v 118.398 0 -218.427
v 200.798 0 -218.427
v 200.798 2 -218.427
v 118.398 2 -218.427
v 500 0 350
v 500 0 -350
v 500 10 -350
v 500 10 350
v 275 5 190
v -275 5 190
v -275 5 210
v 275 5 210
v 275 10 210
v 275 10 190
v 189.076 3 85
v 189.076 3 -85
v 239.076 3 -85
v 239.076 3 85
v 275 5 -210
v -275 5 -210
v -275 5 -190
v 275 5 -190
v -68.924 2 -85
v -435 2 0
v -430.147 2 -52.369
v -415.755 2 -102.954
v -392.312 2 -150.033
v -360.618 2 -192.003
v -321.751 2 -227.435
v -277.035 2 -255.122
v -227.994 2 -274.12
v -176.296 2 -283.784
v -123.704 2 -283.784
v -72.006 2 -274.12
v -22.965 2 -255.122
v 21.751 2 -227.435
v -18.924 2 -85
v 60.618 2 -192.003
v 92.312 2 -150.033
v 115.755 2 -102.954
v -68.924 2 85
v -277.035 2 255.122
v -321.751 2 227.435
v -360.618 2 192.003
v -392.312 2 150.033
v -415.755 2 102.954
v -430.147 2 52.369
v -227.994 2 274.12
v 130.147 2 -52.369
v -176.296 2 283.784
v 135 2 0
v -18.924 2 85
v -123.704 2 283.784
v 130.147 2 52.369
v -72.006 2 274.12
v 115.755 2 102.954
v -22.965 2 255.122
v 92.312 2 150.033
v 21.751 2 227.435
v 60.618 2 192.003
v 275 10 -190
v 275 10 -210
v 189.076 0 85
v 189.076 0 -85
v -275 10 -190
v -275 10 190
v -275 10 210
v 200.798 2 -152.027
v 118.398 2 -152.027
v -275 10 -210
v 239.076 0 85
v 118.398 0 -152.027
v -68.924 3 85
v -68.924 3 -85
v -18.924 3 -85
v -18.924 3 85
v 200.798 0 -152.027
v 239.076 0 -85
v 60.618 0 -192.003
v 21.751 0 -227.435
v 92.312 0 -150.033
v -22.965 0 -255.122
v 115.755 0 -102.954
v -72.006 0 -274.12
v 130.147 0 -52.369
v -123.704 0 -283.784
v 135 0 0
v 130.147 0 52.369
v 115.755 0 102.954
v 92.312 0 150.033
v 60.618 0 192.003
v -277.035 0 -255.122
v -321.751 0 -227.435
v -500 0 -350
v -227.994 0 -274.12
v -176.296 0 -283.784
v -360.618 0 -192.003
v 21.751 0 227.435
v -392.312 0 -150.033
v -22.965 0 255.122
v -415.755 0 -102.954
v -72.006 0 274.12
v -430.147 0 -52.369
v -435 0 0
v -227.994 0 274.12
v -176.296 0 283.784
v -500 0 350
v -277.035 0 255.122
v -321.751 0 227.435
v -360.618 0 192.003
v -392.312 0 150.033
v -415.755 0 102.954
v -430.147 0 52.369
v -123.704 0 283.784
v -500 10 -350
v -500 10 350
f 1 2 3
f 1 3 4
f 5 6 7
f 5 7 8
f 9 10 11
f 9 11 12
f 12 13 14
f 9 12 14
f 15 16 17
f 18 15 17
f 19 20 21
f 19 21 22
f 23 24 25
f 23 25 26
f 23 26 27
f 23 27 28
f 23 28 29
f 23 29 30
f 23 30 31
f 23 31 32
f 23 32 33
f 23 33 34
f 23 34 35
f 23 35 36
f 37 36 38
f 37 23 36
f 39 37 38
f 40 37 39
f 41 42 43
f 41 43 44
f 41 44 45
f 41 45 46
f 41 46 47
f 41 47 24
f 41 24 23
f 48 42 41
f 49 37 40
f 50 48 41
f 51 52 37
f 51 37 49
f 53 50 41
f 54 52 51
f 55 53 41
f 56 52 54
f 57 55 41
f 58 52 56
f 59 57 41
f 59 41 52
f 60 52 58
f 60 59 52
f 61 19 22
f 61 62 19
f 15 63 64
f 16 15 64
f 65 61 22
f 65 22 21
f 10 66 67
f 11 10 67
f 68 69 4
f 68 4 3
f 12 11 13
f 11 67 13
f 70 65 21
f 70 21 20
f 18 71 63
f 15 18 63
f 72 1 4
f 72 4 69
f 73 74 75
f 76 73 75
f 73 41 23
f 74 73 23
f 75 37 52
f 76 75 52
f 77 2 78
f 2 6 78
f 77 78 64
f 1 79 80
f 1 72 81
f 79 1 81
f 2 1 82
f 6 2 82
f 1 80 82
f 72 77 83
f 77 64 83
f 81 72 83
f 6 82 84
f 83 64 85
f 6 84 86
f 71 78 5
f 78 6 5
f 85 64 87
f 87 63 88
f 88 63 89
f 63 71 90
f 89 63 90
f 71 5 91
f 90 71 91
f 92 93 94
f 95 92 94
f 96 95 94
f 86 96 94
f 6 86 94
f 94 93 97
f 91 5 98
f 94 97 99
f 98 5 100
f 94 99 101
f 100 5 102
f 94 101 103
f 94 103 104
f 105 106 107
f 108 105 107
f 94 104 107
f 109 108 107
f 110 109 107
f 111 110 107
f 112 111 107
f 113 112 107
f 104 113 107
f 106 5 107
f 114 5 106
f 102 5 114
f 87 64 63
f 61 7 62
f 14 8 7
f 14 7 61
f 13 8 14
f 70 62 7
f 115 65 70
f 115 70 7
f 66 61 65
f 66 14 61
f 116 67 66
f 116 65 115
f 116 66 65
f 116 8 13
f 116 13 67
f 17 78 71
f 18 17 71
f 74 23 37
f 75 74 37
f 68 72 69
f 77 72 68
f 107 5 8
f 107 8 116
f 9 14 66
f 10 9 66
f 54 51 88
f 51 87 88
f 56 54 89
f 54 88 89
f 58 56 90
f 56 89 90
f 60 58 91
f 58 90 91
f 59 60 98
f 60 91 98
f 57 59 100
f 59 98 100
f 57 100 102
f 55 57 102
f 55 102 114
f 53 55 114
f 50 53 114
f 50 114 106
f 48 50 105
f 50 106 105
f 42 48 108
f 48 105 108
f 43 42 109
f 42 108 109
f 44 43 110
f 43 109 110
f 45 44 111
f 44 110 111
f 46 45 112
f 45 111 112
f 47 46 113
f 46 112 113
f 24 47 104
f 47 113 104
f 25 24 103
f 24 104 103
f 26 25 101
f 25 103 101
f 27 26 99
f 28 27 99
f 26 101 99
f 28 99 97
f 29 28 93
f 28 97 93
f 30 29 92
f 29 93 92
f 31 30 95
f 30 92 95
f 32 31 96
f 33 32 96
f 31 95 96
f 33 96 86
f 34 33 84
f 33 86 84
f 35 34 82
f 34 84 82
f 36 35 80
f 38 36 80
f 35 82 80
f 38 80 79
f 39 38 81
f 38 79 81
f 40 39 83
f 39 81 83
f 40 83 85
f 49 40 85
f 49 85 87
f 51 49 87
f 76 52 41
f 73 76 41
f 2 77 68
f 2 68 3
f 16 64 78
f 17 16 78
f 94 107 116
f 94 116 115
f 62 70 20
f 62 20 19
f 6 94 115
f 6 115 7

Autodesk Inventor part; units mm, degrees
ref_plane "YZ Plane" through (0, 0, 0) normal (1, 0, 0) x (0, 1, 0)
ref_plane "XZ Plane" through (0, 0, 0) normal (0, 1, 0) x (-1, 0, 0)
ref_plane "XY Plane" through (0, 0, 0) normal (0, 0, 1) x (1, 0, 0)
sketch "Sketch1" plane through (0, 0, 0) normal (0, 1, 0) x (-1, 0, 0)
  line L0 (500, -350) -> (-500, -350)
  line L1 (-500, -350) -> (-500, 350)
  line L2 (-500, 350) -> (500, 350)
  line L3 (500, 350) -> (500, -350)
  line L4 (500, -350) -> (-500, 350) construction
  line L5 (-500, -350) -> (500, 350) construction
  point P0 (0, 0)
  dimension "d0" = 1000
  dimension "d1" = 700
extrude "Extrusion1" add sketch "Sketch1" along normal blind 10
sketch "Sketch2" plane through (0, 10, 0) normal (0, 1, 0) x (1, 0, 0)
  line L0 (-500, -350) -> (500, -350) projected
  line L1 (500, -350) -> (500, 350) projected
  line L2 (500, 350) -> (-500, 350) projected
  line L3 (-500, 350) -> (-500, -350) projected
  line L4 (-275, -210) -> (275, -210) construction
  line L5 (275, -210) -> (275, 210) construction
  line L6 (275, 210) -> (-275, 210) construction
  line L7 (-275, 210) -> (-275, -210) construction
  line L8 (-275, -210) -> (275, 210) construction
  line L9 (275, -210) -> (-275, 210) construction
  line L10 (-275, -210) -> (275, -210)
  line L11 (275, -210) -> (275, -190)
  line L12 (275, -190) -> (-275, -190)
  line L13 (-275, -190) -> (-275, -210)
  line L14 (-275, 210) -> (275, 210)
  line L15 (275, 210) -> (275, 190)
  line L16 (275, 190) -> (-275, 190)
  line L17 (-275, 190) -> (-275, 210)
  point P0 (0, 0)
  dimension "d4" = 550
  dimension "d5" = 420
  dimension "d6" = 20
  dimension "d7" = 20
extrude "Extrusion2" cut sketch "Sketch2" against normal blind 5 contours L13 L12 L11 L10 | L14 L15 L16 L17
sketch "Sketch3" plane through (0, 0, 0) normal (0, -1, 0) x (1, 0, 0)
  line L0 (-500, 350) -> (500, 350) projected
  line L1 (-500, -350) -> (-500, 350) projected
  line L2 (500, -350) -> (-500, -350) projected
  line L3 (500, 350) -> (500, -350) projected
  line L4 (500, -350) -> (-500, -350) construction
  line L5 (0, -350) -> (0, 350) construction
  line L6 (-500, -350) -> (-500, 350) construction
  line L7 (-500, 0) -> (500, 0) construction
  circle A0 centre (-150, 0) radius 285
  circle A1 centre (-150, 0) radius 325 construction
  line L8 (200.7977, -218.4266) -> (118.3977, -218.4266)
  line L9 (118.3977, -218.4266) -> (118.3977, -152.0266)
  line L10 (118.3977, -152.0266) -> (200.7977, -152.0266)
  line L11 (200.7977, -152.0266) -> (200.7977, -218.4266)
  line L12 (-18.9239, 85) -> (-68.9239, 85)
  line L13 (-68.9239, 85) -> (-68.9239, -85)
  line L14 (-68.9239, -85) -> (-18.9239, -85)
  line L15 (-18.9239, -85) -> (-18.9239, 85)
  line L16 (239.0761, 85) -> (189.0761, 85)
  line L17 (189.0761, 85) -> (189.0761, -85)
  line L18 (189.0761, -85) -> (239.0761, -85)
  line L19 (239.0761, -85) -> (239.0761, 85)
  circle A2 centre (-150, 0) radius 160 construction
  line L20 (200.7977, -152.0266) -> (118.3977, -218.4266) construction
  line L21 (118.3977, -152.0266) -> (200.7977, -218.4266) construction
  circle A3 centre (159.5977, -185.2266) radius 48 construction
  line L22 (239.0761, -85) -> (189.0761, 85) construction
  line L23 (239.0761, 85) -> (189.0761, -85) construction
  line L24 (-18.9239, -85) -> (-68.9239, 85) construction
  line L25 (-18.9239, 85) -> (-68.9239, -85) construction
  line L26 (214.0761, 0) -> (-43.9239, 0) construction
  point P0 (0, 0)
  point P1 (85.0761, 0)
  dimension "d10" = 570
  dimension "d11" = 650
  dimension "d12" = 82.4
  dimension "d13" = 66.4
  dimension "d14" = 50
  dimension "d15" = 170
  dimension "d16" = 50
  dimension "d17" = 170
  dimension "d18" = 320
  dimension "d19" = 350
  dimension "d20" = 96
  dimension "d21" = 258
extrude "Extrusion3" cut sketch "Sketch3" against normal blind 1 contours A0 | L8 L9 L10 L11
extrude "Extrusion4" cut sketch "Sketch3" against normal blind 2 contours L15 L14 L13 L12 | L19 L18 L17 L16
extrude "Extrusion5" cut sketch "Sketch3" against normal blind 0.1 contours A0 | L8 L9 L10 L11
extrude "Extrusion6" cut sketch "Sketch3" against normal blind 1 contours A0 | L8 L9 L10 L11
extrude "Extrusion7" cut sketch "Sketch3" against normal blind 2 contours A0 | L8 L9 L10 L11
extrude "Extrusion8" cut sketch "Sketch3" against normal blind 3 contours L15 L14 L13 L12 | L19 L18 L17 L16
properties part number "Base Plate" material "Acetal Resin, White"
